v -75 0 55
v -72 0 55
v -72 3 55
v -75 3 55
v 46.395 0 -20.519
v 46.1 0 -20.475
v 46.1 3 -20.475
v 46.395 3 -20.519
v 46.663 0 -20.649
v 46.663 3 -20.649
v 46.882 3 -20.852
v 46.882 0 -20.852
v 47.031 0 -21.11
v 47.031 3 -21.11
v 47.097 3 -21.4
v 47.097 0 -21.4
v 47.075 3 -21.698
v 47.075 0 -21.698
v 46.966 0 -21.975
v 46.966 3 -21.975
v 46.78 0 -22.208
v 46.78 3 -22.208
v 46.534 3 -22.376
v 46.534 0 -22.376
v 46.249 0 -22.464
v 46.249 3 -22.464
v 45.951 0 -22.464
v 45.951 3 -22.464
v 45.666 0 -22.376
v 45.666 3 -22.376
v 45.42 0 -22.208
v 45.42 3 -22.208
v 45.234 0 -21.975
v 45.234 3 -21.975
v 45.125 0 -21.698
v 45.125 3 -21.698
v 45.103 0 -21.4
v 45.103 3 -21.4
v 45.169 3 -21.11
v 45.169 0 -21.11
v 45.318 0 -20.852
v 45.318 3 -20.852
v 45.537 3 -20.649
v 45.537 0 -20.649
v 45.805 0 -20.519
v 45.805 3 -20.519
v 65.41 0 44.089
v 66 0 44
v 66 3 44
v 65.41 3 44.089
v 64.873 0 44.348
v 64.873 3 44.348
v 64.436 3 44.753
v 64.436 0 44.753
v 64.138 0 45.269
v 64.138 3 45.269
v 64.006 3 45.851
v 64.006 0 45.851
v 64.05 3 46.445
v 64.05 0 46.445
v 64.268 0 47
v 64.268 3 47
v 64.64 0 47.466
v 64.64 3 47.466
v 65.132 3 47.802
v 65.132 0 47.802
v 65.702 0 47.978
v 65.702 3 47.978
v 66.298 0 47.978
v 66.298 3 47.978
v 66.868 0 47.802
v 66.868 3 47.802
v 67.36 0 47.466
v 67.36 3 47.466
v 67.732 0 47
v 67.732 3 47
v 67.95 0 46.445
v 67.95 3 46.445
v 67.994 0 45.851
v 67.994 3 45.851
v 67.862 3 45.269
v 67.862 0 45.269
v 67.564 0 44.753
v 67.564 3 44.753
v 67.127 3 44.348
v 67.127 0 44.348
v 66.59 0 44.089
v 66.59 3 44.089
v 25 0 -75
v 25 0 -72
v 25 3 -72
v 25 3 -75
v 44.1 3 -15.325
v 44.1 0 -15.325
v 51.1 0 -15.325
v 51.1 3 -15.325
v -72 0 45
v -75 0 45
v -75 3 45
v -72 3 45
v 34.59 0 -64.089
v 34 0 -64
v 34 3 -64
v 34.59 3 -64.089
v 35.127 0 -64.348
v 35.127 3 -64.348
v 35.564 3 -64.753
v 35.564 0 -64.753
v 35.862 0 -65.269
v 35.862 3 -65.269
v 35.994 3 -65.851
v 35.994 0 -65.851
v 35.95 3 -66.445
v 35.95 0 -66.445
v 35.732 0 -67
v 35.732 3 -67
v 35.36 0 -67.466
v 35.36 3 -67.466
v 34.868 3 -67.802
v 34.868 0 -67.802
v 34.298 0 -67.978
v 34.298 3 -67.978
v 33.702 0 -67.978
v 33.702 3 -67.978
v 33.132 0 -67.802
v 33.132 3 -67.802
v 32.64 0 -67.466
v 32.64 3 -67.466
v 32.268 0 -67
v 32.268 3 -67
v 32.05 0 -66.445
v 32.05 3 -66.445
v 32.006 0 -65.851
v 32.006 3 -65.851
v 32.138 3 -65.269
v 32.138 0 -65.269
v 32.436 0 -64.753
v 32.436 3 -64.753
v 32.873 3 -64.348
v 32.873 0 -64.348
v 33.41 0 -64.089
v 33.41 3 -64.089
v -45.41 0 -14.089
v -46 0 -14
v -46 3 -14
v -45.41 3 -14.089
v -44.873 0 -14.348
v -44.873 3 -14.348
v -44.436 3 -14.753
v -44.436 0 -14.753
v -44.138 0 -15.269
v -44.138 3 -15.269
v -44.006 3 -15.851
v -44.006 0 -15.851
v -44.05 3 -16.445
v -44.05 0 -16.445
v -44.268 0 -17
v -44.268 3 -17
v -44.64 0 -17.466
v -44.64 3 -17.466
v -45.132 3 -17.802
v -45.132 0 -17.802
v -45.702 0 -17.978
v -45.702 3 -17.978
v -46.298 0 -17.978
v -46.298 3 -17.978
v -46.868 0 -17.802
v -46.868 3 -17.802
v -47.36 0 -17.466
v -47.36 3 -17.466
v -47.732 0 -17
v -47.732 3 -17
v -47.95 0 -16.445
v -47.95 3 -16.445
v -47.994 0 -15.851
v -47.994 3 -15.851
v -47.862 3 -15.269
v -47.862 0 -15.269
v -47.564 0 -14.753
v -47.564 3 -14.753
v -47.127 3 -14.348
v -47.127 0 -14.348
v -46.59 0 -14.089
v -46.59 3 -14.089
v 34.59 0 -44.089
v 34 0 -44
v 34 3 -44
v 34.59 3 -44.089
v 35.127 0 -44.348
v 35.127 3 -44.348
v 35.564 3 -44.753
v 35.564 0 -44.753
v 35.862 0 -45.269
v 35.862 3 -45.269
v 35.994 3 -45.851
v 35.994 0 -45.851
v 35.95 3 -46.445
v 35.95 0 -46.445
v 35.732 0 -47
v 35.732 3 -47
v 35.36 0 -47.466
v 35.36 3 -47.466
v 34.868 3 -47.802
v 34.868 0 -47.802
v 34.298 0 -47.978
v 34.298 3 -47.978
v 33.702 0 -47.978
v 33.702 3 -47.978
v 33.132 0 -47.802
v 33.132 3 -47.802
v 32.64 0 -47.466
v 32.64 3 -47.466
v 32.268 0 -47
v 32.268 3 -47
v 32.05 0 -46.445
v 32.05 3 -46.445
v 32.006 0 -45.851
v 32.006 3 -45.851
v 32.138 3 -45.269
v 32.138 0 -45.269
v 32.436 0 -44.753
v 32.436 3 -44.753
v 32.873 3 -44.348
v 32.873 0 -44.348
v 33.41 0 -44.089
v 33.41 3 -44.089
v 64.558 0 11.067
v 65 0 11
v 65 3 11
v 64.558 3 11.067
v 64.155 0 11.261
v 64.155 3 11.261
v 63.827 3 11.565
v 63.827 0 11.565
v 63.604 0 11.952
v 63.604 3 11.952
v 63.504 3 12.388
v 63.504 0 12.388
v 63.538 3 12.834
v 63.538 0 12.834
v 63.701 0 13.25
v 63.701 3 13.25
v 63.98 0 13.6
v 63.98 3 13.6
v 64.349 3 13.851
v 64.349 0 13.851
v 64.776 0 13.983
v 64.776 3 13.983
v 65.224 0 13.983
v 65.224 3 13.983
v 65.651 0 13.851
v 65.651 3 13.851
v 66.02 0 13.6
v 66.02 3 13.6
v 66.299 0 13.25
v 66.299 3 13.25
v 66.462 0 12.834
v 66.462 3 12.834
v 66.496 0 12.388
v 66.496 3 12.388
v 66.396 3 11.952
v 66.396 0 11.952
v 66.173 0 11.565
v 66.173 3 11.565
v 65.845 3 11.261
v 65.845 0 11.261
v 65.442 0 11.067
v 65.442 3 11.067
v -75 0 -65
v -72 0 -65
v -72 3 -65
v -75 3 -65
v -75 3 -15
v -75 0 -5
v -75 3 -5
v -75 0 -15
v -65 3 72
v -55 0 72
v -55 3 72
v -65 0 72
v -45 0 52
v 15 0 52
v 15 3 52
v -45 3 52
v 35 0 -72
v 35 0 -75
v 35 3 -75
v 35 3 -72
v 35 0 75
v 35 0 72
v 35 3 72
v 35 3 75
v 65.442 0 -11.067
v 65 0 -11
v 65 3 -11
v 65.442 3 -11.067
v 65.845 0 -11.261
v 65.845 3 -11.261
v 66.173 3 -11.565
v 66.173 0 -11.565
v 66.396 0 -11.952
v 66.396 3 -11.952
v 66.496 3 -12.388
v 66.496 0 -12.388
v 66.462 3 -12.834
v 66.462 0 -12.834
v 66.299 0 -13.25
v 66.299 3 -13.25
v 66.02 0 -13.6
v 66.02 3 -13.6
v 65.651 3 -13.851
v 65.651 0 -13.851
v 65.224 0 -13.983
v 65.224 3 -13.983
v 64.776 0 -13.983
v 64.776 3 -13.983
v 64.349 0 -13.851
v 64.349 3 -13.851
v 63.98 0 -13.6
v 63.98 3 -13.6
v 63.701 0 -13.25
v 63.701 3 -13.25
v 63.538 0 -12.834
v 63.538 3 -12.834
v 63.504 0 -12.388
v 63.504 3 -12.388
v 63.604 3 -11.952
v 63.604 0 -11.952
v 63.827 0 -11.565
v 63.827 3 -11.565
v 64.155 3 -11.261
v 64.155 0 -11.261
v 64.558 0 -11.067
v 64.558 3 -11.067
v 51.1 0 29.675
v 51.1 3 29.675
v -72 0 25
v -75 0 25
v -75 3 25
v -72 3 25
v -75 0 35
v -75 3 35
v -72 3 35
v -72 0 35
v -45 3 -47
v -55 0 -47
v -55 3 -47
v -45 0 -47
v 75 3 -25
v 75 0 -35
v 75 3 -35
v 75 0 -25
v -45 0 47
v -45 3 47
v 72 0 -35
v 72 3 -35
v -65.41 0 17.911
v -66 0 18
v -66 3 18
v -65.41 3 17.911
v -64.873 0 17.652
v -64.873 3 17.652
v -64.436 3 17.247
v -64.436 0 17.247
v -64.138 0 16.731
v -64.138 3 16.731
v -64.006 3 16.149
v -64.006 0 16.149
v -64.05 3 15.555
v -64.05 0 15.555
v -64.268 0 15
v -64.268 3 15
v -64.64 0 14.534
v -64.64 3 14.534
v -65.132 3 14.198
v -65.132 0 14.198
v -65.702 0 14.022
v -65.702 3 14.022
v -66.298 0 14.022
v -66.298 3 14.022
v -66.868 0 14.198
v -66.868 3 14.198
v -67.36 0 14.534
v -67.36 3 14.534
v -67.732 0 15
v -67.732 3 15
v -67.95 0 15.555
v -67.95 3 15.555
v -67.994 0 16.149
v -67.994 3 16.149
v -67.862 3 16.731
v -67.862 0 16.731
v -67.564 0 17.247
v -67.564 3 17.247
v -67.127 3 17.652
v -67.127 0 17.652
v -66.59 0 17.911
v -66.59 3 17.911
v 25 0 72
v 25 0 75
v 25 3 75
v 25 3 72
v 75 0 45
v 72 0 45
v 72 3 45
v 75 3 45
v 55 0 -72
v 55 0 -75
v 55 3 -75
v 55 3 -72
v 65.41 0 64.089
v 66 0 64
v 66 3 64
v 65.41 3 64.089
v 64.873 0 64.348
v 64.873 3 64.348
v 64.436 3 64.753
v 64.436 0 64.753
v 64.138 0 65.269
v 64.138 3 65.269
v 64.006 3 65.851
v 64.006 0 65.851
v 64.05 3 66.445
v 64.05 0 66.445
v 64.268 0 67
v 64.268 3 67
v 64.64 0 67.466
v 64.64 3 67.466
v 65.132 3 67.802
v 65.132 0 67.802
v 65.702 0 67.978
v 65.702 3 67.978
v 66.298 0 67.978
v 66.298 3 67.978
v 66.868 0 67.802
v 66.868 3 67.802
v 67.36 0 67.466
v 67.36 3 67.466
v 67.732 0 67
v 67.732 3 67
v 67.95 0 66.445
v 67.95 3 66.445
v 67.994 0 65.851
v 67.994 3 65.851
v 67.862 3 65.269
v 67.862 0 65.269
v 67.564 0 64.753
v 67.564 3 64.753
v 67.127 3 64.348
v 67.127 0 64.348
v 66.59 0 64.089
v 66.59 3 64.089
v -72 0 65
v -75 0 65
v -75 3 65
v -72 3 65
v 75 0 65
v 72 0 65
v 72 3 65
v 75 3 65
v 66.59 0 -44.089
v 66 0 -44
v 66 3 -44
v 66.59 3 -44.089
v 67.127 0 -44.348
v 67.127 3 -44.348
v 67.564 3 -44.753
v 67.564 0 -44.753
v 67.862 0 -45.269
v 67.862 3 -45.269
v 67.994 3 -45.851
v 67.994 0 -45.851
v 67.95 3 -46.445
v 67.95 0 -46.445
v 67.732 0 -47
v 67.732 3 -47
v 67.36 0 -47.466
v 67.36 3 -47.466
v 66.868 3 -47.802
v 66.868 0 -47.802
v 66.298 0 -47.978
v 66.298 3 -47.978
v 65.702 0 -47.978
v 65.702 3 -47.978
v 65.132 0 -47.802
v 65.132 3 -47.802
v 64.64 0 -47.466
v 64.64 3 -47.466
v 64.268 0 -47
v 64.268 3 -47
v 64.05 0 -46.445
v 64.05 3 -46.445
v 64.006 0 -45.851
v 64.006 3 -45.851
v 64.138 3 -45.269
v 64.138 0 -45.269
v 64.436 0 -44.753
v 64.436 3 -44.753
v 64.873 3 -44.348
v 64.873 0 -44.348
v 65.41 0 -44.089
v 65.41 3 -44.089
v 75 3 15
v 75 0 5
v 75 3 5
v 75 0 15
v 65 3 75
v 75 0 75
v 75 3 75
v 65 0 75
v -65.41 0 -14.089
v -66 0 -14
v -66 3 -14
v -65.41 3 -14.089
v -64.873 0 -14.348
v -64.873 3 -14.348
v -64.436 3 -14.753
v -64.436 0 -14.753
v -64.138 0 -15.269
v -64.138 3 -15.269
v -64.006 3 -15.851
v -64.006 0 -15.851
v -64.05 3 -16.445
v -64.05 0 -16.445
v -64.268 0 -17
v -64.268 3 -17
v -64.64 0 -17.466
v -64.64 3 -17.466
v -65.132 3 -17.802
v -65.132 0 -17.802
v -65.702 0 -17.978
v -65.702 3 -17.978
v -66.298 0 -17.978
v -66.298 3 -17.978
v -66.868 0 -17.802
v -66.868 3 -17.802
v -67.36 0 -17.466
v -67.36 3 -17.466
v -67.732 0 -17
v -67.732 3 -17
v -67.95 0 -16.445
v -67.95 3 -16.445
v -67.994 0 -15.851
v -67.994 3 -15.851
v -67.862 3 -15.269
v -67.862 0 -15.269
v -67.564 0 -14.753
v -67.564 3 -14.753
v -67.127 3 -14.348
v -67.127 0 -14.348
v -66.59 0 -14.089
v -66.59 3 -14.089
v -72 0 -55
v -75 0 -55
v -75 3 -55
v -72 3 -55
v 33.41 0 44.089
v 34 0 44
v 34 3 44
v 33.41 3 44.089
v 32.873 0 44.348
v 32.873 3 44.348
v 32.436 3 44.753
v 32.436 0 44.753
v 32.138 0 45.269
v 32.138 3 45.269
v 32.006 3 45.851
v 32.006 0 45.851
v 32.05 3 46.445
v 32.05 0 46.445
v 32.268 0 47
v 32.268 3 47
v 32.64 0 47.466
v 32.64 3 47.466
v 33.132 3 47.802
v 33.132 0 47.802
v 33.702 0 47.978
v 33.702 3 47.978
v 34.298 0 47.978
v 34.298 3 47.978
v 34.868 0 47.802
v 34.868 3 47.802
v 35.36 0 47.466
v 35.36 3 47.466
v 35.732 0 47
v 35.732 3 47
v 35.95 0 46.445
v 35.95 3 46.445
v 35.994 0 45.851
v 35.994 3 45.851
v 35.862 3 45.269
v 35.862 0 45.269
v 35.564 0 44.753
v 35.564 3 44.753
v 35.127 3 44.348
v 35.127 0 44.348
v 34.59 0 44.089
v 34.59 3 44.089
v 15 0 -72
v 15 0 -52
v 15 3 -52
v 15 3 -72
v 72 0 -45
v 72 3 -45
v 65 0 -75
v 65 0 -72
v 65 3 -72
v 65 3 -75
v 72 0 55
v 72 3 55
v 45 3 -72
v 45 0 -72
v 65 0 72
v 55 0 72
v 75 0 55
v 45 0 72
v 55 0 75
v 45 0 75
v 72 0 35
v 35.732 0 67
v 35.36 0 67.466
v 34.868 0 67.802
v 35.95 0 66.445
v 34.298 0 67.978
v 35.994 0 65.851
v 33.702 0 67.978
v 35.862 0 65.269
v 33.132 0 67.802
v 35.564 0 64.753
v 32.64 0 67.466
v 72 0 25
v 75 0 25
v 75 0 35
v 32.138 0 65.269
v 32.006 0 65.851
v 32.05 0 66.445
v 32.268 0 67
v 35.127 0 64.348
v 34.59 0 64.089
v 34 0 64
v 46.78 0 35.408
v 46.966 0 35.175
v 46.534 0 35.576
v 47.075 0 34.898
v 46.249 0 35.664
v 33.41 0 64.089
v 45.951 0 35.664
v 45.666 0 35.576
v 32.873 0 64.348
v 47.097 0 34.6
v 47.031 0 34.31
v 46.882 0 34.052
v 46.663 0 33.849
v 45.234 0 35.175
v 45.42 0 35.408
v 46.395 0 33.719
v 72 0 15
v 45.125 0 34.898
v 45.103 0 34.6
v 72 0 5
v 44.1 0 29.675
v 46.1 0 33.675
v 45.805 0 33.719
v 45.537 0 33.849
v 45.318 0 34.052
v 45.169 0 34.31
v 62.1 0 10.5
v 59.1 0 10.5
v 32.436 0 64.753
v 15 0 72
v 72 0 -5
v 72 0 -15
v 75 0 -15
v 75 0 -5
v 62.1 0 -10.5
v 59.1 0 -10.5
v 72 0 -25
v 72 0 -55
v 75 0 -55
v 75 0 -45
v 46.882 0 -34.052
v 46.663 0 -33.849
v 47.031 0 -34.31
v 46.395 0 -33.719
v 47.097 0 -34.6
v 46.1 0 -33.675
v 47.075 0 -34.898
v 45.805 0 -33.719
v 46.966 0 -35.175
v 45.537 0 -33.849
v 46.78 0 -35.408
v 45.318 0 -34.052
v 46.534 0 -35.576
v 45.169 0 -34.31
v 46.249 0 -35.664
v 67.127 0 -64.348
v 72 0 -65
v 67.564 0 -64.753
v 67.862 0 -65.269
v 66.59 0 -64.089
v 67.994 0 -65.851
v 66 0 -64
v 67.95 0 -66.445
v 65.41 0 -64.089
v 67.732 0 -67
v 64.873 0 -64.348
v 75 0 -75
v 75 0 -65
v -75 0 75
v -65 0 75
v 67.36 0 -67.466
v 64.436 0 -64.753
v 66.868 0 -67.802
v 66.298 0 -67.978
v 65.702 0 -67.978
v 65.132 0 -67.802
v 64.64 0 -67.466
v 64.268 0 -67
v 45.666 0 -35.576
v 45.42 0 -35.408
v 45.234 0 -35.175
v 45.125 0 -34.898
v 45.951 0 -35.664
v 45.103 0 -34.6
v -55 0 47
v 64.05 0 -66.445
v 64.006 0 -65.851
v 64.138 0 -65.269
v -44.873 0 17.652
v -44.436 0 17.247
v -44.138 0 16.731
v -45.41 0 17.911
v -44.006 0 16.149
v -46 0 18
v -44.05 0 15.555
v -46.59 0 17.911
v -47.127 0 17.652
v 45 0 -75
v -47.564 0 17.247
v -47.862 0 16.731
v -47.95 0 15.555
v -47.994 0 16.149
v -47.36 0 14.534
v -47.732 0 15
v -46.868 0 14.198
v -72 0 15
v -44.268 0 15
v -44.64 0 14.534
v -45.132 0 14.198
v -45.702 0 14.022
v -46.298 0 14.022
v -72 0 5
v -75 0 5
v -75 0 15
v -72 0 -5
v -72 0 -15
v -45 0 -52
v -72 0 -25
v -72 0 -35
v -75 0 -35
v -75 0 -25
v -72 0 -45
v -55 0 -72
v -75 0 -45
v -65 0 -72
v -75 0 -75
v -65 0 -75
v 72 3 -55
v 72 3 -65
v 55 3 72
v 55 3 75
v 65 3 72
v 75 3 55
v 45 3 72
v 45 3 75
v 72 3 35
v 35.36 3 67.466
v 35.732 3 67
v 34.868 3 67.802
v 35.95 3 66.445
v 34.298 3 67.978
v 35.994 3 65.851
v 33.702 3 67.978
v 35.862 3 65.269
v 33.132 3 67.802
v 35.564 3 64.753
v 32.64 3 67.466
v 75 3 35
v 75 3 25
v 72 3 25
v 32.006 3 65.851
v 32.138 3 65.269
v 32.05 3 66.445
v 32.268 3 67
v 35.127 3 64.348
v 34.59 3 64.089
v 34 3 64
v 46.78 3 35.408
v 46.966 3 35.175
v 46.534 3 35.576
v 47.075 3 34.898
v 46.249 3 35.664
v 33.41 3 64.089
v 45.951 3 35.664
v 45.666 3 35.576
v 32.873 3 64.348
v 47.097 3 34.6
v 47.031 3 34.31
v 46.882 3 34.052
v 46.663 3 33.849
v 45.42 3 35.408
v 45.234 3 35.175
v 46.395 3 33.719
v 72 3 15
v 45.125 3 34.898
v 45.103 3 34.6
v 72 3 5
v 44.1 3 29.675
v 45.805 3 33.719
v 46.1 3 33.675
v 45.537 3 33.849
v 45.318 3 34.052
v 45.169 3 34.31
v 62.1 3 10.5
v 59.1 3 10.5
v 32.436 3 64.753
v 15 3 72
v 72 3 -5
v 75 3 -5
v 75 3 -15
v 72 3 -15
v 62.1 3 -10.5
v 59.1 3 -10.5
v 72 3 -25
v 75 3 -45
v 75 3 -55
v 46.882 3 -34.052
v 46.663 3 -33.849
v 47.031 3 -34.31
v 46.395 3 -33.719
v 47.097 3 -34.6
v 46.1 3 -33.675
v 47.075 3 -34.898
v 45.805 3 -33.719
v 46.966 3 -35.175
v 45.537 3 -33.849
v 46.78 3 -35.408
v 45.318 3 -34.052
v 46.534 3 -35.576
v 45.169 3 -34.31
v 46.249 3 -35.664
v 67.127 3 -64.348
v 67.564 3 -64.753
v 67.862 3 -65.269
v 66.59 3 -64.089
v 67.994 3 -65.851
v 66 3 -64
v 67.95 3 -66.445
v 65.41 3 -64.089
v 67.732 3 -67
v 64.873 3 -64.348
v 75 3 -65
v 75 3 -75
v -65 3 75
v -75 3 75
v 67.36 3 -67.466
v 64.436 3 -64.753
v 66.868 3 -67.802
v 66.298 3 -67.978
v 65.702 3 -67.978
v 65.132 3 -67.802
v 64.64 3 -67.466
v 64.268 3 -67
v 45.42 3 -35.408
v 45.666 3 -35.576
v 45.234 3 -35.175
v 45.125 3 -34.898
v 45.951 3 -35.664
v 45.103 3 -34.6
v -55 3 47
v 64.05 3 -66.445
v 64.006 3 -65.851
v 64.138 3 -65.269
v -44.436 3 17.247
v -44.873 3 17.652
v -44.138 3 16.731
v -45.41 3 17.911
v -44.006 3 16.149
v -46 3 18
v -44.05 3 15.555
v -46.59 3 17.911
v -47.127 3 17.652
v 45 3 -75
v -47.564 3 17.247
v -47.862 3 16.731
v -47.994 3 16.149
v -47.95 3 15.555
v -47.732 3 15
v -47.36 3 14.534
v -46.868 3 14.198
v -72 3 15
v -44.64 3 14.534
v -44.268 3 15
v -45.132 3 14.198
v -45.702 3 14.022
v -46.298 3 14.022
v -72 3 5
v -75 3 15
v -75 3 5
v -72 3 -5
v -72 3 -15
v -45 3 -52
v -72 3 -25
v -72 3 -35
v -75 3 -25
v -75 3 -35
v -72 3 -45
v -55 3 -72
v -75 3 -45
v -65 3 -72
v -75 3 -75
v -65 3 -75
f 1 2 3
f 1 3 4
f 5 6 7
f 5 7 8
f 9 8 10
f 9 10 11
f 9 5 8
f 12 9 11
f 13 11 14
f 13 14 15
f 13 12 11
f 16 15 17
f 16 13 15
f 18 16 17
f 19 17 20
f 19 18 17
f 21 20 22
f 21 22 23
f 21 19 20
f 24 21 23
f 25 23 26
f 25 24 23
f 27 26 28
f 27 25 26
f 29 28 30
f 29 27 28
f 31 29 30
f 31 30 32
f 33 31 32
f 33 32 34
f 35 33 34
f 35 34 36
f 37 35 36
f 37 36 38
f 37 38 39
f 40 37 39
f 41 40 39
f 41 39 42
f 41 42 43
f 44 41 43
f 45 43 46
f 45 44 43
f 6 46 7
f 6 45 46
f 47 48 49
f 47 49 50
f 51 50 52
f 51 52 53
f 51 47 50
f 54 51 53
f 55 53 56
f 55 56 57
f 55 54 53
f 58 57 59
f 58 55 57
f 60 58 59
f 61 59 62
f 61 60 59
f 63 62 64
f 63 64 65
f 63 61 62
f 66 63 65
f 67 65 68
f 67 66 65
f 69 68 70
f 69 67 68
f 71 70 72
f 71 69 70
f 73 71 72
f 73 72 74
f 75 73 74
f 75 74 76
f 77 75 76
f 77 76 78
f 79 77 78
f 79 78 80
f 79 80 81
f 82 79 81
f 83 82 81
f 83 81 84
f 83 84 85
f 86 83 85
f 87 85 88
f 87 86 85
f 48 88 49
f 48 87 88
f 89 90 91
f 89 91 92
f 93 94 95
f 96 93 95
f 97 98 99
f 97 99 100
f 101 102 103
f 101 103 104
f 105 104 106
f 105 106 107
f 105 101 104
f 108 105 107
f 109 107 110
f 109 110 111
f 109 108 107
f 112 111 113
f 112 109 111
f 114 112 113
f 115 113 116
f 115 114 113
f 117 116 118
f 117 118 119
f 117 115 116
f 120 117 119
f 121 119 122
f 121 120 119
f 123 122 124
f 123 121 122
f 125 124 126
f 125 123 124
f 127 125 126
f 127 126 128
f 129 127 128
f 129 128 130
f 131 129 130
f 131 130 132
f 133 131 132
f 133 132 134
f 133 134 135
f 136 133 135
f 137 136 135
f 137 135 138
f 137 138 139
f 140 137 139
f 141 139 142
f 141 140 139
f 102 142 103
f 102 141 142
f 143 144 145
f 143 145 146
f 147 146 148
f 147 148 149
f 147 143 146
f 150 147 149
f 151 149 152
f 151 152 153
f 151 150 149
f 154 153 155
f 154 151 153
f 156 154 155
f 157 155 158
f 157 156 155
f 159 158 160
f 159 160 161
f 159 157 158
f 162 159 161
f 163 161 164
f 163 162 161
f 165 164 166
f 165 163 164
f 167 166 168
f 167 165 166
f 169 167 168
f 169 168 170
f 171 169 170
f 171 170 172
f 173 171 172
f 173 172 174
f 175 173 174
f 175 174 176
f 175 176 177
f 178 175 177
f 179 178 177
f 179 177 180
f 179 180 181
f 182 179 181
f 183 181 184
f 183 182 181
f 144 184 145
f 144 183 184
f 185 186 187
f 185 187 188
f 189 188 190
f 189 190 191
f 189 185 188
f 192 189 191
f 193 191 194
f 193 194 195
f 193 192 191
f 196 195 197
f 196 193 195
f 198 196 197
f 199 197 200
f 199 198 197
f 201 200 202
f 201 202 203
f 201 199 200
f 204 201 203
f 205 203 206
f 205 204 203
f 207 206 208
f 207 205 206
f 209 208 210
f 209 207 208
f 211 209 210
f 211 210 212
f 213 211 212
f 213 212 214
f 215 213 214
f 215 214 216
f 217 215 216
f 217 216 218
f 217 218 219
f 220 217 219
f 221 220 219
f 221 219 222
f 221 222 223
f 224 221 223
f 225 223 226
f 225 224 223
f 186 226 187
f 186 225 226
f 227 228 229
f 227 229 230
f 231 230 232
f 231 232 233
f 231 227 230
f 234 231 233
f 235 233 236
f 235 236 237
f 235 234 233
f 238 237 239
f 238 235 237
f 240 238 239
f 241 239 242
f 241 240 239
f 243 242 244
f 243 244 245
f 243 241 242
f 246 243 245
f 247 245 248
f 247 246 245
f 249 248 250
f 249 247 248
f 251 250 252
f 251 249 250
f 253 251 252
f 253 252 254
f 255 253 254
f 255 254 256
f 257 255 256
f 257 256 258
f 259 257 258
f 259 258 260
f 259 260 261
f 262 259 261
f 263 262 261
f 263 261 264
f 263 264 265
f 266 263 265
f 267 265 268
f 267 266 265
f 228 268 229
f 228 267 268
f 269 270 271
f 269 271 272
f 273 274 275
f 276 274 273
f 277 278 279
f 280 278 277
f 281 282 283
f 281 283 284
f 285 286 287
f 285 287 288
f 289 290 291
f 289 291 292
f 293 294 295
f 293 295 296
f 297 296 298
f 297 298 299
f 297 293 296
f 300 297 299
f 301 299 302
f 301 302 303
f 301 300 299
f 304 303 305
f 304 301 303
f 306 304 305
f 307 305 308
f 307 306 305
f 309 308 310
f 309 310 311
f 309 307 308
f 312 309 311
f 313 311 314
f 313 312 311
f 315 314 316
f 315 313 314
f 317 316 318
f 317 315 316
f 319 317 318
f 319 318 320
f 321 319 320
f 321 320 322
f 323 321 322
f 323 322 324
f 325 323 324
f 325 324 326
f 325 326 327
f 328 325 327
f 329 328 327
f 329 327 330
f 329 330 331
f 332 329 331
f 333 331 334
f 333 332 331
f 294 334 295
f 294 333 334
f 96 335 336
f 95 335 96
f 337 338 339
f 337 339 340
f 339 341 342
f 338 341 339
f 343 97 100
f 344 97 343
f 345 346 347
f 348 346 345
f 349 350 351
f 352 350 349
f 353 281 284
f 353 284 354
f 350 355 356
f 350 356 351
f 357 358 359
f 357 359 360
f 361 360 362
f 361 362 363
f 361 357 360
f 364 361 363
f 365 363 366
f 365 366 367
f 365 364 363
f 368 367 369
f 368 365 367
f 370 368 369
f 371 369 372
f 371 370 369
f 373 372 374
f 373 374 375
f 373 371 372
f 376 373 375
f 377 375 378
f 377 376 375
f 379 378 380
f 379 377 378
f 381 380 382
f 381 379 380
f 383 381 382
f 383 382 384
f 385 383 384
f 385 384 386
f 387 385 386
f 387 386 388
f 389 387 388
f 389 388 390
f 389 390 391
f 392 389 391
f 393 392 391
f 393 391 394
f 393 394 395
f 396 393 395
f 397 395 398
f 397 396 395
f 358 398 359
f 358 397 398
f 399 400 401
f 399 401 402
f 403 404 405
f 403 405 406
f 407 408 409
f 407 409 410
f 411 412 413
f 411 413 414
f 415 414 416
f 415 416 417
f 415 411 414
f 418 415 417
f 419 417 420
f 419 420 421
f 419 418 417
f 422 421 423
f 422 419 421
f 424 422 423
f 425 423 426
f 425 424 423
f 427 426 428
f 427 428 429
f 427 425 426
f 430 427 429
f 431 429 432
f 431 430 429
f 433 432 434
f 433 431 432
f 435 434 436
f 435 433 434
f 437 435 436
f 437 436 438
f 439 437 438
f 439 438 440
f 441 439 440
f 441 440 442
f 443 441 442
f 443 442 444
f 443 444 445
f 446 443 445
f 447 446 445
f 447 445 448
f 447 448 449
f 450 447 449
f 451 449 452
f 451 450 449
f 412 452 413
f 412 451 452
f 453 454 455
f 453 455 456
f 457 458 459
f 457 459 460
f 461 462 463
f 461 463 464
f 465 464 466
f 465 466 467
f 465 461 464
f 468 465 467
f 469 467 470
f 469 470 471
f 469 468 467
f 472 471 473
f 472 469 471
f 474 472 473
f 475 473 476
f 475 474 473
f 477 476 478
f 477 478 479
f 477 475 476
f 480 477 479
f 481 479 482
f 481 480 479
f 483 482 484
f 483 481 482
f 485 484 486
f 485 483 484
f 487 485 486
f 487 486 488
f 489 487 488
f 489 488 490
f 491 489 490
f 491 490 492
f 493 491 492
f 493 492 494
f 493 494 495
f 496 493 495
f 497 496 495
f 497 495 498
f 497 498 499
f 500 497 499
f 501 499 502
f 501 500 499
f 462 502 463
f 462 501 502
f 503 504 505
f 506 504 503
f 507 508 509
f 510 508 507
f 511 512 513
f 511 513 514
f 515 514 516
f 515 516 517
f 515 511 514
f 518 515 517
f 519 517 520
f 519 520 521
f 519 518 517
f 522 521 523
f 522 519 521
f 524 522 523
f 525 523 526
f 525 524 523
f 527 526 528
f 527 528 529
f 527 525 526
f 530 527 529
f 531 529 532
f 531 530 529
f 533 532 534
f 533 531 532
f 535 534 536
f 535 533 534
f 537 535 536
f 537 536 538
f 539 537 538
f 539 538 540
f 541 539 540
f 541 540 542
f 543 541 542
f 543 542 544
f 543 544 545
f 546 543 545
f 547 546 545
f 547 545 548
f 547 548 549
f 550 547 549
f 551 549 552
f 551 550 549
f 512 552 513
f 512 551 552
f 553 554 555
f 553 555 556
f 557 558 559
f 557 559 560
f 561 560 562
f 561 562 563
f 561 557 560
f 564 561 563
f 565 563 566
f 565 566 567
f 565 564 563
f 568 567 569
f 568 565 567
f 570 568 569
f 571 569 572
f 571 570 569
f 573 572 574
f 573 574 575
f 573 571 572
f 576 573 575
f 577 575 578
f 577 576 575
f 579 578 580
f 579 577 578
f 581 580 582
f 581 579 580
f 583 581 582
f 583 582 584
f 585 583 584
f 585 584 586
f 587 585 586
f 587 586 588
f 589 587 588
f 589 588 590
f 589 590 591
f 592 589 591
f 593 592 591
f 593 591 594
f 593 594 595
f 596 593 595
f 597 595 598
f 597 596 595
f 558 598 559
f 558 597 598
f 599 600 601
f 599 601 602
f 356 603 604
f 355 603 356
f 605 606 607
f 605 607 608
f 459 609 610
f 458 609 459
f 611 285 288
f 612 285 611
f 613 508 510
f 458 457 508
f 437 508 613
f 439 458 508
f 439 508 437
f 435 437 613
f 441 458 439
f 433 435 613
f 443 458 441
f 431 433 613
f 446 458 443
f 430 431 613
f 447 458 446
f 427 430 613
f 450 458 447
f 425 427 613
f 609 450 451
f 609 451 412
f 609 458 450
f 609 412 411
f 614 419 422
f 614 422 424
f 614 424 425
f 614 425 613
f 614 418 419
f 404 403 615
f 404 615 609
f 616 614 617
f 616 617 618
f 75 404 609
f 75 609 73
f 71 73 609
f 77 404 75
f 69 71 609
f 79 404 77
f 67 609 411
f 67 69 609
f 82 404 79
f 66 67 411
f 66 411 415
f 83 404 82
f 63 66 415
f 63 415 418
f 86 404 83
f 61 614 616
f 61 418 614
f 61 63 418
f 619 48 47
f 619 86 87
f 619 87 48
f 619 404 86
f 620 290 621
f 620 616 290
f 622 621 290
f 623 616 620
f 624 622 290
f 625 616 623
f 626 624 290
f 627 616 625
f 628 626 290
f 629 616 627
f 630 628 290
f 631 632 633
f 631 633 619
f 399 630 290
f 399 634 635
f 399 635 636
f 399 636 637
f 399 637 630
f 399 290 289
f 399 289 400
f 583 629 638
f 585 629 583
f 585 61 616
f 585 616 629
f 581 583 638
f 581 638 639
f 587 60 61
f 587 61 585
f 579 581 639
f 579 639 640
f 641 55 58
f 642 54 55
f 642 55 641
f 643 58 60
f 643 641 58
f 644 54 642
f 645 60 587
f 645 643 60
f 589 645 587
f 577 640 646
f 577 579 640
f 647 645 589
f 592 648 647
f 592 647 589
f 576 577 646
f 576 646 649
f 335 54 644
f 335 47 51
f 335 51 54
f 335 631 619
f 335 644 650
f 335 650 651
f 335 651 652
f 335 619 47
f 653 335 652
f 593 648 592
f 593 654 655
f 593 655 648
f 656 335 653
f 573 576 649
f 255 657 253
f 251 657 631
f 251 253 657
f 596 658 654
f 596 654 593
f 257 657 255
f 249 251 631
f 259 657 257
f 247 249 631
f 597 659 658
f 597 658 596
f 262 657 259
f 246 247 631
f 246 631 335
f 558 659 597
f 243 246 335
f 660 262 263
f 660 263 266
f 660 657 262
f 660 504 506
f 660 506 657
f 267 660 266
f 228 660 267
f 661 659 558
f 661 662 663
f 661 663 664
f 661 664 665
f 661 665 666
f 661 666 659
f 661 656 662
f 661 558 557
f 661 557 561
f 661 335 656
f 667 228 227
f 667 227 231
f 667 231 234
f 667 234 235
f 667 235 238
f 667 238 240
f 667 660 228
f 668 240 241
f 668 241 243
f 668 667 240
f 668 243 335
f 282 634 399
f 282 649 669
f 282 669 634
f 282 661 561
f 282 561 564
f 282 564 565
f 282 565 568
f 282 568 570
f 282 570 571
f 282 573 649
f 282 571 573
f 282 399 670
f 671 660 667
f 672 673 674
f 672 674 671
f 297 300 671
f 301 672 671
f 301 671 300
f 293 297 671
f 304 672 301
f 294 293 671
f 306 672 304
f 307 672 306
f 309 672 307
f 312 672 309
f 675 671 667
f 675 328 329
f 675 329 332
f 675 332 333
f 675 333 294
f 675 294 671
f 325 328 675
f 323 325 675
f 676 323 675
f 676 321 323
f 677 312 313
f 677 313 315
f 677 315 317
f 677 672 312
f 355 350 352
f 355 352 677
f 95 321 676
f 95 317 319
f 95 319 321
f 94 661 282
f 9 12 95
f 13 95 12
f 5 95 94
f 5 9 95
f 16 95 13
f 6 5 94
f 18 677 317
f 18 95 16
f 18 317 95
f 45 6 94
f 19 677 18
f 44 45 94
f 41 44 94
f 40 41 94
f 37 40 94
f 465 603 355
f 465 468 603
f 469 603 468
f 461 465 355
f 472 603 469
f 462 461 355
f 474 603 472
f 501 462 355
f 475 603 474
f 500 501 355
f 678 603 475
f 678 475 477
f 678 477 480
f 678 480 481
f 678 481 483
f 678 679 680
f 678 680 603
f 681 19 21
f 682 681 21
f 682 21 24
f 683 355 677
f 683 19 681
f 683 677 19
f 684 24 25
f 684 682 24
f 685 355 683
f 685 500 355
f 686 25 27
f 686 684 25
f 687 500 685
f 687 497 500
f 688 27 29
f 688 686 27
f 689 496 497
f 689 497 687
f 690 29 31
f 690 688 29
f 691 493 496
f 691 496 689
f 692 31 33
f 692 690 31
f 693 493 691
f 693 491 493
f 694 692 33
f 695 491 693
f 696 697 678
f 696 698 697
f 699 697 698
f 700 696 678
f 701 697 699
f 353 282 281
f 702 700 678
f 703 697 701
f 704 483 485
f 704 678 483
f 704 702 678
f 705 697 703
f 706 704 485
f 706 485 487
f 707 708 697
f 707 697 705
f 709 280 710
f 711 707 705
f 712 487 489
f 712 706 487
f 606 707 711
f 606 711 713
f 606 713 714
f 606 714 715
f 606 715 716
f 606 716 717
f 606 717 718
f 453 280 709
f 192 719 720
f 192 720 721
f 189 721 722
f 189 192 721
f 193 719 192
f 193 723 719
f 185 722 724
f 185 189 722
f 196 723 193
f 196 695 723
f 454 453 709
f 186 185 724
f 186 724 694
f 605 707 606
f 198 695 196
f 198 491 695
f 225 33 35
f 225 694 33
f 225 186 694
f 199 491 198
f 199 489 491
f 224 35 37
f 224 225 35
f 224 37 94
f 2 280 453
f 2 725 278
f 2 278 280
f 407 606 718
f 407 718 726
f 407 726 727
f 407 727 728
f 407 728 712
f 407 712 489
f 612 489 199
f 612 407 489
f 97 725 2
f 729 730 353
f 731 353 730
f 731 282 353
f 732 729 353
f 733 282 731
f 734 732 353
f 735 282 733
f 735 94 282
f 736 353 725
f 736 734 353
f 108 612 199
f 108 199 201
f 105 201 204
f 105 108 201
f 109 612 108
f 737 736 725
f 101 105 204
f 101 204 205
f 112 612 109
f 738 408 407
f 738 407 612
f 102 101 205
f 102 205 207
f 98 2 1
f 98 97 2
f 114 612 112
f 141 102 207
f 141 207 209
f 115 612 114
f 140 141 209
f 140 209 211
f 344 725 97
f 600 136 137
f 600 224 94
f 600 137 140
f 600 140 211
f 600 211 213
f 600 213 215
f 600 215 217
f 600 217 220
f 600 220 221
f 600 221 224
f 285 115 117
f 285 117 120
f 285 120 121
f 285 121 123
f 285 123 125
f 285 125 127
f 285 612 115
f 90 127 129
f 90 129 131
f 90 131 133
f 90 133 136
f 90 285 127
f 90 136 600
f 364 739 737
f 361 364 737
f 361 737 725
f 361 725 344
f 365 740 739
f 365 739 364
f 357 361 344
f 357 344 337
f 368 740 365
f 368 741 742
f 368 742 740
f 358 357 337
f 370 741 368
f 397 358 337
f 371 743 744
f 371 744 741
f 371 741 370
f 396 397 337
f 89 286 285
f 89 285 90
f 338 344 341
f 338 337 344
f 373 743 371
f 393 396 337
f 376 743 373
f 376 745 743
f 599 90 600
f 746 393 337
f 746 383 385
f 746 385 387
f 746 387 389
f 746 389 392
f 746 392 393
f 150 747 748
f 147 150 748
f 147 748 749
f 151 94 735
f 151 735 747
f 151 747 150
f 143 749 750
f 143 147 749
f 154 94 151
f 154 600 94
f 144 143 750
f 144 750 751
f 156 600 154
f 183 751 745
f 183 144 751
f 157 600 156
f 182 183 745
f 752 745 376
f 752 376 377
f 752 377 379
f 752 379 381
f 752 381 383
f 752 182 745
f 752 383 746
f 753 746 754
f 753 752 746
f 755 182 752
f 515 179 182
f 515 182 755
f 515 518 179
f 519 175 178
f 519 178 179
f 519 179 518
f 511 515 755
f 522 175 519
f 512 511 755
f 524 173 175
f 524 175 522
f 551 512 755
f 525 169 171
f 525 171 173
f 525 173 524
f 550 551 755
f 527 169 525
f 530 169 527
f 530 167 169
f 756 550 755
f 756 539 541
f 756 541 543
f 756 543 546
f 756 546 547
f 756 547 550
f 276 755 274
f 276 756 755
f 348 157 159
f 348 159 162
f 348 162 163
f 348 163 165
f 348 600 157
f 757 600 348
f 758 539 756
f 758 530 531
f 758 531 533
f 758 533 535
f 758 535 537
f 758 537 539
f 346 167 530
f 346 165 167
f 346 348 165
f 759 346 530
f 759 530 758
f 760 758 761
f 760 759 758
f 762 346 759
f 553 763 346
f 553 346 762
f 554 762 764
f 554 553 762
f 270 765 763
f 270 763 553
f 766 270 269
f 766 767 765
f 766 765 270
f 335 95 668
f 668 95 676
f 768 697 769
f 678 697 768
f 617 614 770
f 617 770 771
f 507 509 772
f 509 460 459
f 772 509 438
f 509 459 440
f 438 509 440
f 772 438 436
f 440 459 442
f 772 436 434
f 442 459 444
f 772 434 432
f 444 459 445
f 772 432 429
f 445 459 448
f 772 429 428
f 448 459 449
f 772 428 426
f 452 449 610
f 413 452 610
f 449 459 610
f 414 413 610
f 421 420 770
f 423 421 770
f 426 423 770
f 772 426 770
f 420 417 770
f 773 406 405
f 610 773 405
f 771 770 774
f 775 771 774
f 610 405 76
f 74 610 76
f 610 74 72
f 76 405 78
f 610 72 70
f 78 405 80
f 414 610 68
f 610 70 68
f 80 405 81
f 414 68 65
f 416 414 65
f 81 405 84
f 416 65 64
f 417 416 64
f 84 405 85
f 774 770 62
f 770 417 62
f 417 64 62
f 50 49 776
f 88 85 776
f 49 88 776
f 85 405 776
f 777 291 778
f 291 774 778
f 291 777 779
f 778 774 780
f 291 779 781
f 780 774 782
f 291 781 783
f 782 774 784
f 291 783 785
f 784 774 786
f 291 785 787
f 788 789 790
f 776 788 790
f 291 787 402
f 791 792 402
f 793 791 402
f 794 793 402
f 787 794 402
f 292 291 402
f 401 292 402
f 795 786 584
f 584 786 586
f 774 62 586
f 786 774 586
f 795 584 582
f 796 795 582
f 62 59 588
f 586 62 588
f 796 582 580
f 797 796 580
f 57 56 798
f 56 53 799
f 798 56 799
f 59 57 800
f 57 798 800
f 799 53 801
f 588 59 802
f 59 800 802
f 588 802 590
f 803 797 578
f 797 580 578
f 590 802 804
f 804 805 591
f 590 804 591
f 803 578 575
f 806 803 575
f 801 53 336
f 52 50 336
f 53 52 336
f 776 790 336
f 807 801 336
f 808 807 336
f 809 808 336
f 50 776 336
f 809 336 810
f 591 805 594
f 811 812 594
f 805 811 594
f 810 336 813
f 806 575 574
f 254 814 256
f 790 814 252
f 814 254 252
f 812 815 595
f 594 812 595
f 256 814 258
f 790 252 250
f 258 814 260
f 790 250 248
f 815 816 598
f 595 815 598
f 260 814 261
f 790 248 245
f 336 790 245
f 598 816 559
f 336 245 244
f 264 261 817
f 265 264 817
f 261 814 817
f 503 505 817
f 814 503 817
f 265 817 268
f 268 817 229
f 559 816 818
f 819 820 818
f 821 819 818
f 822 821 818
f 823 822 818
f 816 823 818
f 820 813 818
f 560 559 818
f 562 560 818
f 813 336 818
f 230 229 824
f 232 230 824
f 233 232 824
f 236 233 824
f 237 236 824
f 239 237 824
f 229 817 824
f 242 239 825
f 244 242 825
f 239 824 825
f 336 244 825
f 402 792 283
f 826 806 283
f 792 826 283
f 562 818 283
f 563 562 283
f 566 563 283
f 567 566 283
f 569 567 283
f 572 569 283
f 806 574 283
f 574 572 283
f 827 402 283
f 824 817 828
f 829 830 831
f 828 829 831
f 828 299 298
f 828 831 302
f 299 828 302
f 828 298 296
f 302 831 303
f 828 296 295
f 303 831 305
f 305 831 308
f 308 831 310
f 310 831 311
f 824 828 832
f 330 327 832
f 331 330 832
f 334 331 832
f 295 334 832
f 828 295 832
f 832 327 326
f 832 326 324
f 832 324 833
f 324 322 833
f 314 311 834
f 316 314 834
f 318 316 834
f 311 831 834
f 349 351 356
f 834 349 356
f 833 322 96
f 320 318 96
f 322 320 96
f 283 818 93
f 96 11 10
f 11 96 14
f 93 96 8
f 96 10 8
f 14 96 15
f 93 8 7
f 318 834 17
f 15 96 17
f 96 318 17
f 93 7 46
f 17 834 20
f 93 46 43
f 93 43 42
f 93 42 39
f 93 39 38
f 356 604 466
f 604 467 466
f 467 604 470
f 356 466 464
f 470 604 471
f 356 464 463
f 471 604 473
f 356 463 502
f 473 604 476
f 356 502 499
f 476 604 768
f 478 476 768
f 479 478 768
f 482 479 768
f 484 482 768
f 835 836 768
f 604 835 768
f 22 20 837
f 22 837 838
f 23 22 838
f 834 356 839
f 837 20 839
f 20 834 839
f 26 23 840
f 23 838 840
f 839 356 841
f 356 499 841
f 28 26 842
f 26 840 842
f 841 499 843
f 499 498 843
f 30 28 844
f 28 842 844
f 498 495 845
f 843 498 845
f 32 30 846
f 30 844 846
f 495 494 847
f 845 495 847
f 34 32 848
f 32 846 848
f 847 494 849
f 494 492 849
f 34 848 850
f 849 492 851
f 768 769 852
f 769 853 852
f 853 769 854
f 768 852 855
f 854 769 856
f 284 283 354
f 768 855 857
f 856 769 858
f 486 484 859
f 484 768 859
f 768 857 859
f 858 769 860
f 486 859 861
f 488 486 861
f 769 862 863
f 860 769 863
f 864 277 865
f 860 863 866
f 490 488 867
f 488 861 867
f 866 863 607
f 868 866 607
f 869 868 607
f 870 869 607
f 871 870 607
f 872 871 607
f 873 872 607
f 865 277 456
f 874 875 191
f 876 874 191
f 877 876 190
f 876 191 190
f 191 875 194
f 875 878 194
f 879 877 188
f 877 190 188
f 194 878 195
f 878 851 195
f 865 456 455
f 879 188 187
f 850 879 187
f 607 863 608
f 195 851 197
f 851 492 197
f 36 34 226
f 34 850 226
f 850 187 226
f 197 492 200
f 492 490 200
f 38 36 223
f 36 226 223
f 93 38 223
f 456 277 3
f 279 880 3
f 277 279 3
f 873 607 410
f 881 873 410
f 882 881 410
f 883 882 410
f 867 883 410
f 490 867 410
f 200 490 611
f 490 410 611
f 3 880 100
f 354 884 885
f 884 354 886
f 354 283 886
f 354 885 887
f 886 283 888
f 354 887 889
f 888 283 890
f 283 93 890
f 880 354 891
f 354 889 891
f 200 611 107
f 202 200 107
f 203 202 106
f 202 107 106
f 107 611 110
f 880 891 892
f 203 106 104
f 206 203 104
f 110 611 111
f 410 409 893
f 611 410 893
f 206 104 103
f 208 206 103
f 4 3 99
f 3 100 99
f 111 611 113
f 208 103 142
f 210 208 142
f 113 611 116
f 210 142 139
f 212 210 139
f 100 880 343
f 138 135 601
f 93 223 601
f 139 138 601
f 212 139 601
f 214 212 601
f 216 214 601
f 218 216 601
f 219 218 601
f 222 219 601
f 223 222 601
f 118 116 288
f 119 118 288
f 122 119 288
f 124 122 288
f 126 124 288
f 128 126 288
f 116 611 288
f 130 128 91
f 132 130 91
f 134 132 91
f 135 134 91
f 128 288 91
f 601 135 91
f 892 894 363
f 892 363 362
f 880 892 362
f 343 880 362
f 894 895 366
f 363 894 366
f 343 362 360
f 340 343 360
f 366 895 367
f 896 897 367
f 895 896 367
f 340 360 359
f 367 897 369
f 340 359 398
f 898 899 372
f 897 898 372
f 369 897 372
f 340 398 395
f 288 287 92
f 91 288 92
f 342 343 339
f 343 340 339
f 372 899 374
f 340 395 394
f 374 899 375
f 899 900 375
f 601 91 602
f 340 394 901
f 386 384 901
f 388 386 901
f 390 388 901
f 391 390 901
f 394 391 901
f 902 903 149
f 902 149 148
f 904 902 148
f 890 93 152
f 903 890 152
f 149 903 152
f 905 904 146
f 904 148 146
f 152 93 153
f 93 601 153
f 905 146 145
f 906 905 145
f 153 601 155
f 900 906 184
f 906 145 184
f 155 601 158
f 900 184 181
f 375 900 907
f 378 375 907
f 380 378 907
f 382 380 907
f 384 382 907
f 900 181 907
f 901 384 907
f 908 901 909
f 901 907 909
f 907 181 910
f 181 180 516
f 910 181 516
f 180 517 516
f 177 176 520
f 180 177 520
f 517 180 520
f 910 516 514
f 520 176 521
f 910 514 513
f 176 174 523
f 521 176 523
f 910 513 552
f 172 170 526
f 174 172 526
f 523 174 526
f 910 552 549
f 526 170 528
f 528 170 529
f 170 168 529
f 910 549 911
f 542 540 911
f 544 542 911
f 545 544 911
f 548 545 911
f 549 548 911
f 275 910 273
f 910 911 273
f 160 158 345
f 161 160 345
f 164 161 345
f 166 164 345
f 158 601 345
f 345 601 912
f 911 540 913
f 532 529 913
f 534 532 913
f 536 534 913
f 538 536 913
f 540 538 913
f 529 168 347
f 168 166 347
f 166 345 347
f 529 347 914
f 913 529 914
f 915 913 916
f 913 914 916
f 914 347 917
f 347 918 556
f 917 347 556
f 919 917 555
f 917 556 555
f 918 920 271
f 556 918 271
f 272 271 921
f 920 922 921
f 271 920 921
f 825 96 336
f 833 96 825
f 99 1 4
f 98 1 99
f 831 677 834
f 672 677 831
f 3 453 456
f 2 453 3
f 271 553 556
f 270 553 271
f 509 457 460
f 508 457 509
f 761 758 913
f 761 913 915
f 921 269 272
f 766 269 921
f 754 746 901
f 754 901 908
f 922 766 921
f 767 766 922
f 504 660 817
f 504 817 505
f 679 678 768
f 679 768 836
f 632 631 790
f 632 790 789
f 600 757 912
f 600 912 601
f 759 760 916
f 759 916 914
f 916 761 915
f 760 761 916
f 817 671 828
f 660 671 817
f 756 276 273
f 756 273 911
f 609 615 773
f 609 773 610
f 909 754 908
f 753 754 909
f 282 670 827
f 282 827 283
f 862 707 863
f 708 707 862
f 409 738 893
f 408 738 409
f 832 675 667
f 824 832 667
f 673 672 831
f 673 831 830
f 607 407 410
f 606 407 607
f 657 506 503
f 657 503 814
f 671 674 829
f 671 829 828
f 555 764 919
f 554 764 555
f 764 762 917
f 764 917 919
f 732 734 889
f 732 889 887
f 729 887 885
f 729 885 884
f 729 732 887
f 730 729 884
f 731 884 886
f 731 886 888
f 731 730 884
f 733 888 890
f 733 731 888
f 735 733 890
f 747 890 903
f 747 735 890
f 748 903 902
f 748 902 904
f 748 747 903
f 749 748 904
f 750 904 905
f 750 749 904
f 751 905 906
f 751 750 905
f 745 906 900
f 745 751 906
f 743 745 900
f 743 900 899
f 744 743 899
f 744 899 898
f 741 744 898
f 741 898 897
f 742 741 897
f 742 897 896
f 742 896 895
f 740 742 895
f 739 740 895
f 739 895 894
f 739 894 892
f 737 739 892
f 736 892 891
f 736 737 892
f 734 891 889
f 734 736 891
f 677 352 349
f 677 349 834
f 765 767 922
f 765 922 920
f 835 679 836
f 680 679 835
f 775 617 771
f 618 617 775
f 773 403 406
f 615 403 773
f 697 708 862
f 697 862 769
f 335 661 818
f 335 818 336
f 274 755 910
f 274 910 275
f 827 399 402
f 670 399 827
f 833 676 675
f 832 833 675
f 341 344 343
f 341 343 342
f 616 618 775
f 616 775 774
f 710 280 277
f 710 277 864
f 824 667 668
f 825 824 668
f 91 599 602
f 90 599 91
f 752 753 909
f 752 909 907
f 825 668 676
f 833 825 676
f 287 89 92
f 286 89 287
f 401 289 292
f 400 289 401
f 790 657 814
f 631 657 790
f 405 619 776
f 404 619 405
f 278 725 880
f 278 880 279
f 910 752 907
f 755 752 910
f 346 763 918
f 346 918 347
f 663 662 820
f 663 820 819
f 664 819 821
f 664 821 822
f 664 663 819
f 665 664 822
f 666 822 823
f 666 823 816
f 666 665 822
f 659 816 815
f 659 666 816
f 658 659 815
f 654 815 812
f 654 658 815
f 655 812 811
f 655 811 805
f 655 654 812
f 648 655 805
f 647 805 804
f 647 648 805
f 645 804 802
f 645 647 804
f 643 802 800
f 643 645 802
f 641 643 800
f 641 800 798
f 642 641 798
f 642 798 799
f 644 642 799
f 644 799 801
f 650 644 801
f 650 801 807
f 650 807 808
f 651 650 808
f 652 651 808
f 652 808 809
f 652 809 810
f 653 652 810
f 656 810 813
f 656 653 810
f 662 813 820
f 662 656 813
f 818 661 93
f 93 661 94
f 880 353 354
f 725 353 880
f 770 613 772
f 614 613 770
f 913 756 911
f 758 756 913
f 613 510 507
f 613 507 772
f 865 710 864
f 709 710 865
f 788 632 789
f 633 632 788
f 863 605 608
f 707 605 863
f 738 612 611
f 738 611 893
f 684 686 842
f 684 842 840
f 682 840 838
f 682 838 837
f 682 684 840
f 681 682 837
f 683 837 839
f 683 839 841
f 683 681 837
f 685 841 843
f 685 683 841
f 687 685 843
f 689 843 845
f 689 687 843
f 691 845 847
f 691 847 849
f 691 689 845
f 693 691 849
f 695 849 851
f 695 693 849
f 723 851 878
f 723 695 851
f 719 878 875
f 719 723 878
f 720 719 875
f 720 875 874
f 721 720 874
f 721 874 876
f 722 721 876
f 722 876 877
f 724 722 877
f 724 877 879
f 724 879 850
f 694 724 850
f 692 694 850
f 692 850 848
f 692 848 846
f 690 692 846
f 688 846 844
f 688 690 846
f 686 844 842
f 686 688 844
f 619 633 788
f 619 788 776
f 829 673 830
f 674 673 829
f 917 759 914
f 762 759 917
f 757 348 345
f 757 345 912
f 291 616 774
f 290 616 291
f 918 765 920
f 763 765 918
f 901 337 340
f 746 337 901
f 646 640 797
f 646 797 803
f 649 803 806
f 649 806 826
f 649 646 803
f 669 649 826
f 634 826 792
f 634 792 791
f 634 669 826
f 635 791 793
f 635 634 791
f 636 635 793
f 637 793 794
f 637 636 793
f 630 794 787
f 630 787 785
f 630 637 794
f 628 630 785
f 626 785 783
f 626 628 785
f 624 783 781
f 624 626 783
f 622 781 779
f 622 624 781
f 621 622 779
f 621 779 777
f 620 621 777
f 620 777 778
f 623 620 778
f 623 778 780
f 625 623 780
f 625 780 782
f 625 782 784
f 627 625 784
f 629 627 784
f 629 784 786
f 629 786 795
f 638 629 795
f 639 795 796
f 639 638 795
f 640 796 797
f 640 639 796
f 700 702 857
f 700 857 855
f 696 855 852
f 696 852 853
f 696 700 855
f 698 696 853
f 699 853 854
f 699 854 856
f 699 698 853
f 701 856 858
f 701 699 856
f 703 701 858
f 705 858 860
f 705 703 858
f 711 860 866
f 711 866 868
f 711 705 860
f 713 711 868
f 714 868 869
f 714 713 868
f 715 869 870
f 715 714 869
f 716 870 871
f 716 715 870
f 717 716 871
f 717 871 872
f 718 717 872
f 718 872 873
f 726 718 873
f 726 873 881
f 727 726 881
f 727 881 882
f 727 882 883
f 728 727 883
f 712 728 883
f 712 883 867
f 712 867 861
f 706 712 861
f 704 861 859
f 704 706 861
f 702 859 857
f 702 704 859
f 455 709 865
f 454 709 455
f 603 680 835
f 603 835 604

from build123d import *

# Parameters (mm, degrees)
CROQUIS1_R              = 1.5
CROQUIS1_R_2            = 2
CROQUIS1_R_3            = 1
CROQUIS1_W              = 7
CROQUIS1_H              = 45
SALIENTE_EXTRUIR2_DEPTH = 3


with BuildPart() as part:
    # Croquis1 → Saliente-Extruir2 (new body)
    with BuildSketch(Plane(origin=(0, 0, 0), x_dir=(1, 0, 0), z_dir=(0, 1, 0))):
        Polygon((-75, -75), (-75, -65), (-72, -65), (-72, -55), (-75, -55), (-75, -45), (-72, -45), (-72, -35), (-75, -35), (-75, -25), (-72, -25), (-72, -15), (-75, -15), (-75, -5), (-72, -5), (-72, 5), (-75, 5), (-75, 15), (-72, 15), (-72, 25), (-75, 25), (-75, 35), (-72, 35), (-72, 45), (-75, 45), (-75, 55), (-72, 55), (-72, 65), (-75, 65), (-75, 75), (-65, 75), (-65, 72), (-55, 72), (-55, 47), (-45, 47), (-45, 52), (15, 52), (15, 72), (25, 72), (25, 75), (35, 75), (35, 72), (45, 72), (45, 75), (55, 75), (55, 72), (65, 72), (65, 75), (75, 75), (75, 65), (72, 65), (72, 55), (75, 55), (75, 45), (72, 45), (72, 35), (75, 35), (75, 25), (72, 25), (72, 15), (75, 15), (75, 5), (72, 5), (72, -5), (75, -5), (75, -15), (72, -15), (72, -25), (75, -25), (75, -35), (72, -35), (72, -45), (75, -45), (75, -55), (72, -55), (72, -65), (75, -65), (75, -75), (65, -75), (65, -72), (55, -72), (55, -75), (45, -75), (45, -72), (35, -72), (35, -75), (25, -75), (25, -72), (15, -72), (15, -52), (-45, -52), (-45, -47), (-55, -47), (-55, -72), (-65, -72), (-65, -75), align=None)
        with Locations(Location((65, 12.5, 0), (0, 0, 270))):
            Circle(CROQUIS1_R, mode=Mode.SUBTRACT)
        with Locations(Location((65, -12.5, 0), (0, 0, 90))):
            Circle(CROQUIS1_R, mode=Mode.SUBTRACT)
        with Locations(Location((66, 66, 0), (0, 0, 270))):
            Circle(CROQUIS1_R_2, mode=Mode.SUBTRACT)
        with Locations(Location((34, 66, 0), (0, 0, 270))):
            Circle(CROQUIS1_R_2, mode=Mode.SUBTRACT)
        with Locations(Location((66, 46, 0), (0, 0, 270))):
            Circle(CROQUIS1_R_2, mode=Mode.SUBTRACT)
        with Locations(Location((34, 46, 0), (0, 0, 270))):
            Circle(CROQUIS1_R_2, mode=Mode.SUBTRACT)
        with Locations(Location((66, -46, 0), (0, 0, 90))):
            Circle(CROQUIS1_R_2, mode=Mode.SUBTRACT)
        with Locations(Location((34, -46, 0), (0, 0, 90))):
            Circle(CROQUIS1_R_2, mode=Mode.SUBTRACT)
        with Locations(Location((66, -66, 0), (0, 0, 90))):
            Circle(CROQUIS1_R_2, mode=Mode.SUBTRACT)
        with Locations(Location((34, -66, 0), (0, 0, 90))):
            Circle(CROQUIS1_R_2, mode=Mode.SUBTRACT)
        with Locations(Location((-66, 16, 0), (0, 0, 270))):
            Circle(CROQUIS1_R_2, mode=Mode.SUBTRACT)
        with Locations(Location((-66, -16, 0), (0, 0, 270))):
            Circle(CROQUIS1_R_2, mode=Mode.SUBTRACT)
        with Locations(Location((-46, 16, 0), (0, 0, 270))):
            Circle(CROQUIS1_R_2, mode=Mode.SUBTRACT)
        with Locations(Location((-46, -16, 0), (0, 0, 270))):
            Circle(CROQUIS1_R_2, mode=Mode.SUBTRACT)
        with Locations(Location((46.1, 34.675, 0), (0, 0, 270))):
            Circle(CROQUIS1_R_3, mode=Mode.SUBTRACT)
        with Locations(Location((46.1, -34.675, 0), (0, 0, 90))):
            Circle(CROQUIS1_R_3, mode=Mode.SUBTRACT)
        with Locations(Location((46.1, 21.475, 0), (0, 0, 270))):
            Circle(CROQUIS1_R_3, mode=Mode.SUBTRACT)
        Polygon((59.1, -10.5), (59.1, -7.5), (59.1, 7.5), (59.1, 10.5), (62.1, 10.5), (62.1, -10.5), align=None, mode=Mode.SUBTRACT)
        with Locations((47.6, -7.175)):
            Rectangle(CROQUIS1_W, CROQUIS1_H, mode=Mode.SUBTRACT)
    extrude(amount=SALIENTE_EXTRUIR2_DEPTH)


solid = part.part
